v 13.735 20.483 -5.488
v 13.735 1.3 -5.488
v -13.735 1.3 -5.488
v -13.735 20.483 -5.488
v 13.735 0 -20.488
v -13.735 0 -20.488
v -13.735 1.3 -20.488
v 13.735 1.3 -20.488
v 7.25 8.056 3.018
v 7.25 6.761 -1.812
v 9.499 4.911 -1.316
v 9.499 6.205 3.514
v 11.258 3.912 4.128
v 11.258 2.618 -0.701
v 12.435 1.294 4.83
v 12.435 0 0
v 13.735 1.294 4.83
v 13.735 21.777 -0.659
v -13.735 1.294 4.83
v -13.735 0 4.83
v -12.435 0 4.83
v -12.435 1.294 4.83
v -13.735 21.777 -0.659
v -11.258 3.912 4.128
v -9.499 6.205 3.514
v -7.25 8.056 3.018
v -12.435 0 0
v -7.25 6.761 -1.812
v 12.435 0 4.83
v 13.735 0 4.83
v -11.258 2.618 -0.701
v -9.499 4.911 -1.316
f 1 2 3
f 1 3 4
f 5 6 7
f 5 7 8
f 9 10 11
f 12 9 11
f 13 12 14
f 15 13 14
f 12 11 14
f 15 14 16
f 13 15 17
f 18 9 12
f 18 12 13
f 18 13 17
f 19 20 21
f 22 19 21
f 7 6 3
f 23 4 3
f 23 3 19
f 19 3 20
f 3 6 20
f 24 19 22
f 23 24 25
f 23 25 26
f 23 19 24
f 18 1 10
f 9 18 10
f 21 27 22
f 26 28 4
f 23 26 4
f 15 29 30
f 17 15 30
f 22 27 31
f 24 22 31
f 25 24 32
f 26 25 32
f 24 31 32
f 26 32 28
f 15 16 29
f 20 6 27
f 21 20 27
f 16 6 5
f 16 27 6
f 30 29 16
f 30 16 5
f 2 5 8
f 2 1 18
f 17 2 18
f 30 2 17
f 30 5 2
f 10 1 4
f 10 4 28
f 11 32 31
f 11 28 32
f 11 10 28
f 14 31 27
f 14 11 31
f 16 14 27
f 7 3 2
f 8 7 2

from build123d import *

# Parameters (mm, degrees)
F1_DEPTH = 5
F2_ANGLE = -15
F4_DEPTH = 27.4701582612
F5_W     = 27.4701582612
F5_H     = 15
F6_DEPTH = 1.3
F7_W     = 1.3
F7_H     = 4.8296291314


with BuildPart() as f1:
    # F0 (on Top) → F1 (new body)
    with BuildSketch(Plane.XY):
        with BuildLine():
            ThreePointArc((-12.4350791306, 0), (-10.4463192127, 3.9472350356), (-7.25, 7))
            Line((-7.25, 7), (-13.7350791306, 21.2054114289))
            Line((-13.7350791306, 21.2054114289), (-13.7350791306, 0))
            Line((-13.7350791306, 0), (-12.4350791306, 0))
        make_face()
    extrude(amount=F1_DEPTH)


with BuildPart() as f1b:
    # F0 (on Top) → F1, piece 2 (new body)
    with BuildSketch(Plane.XY):
        with BuildLine():
            Line((13.7350791306, 0), (13.7350791306, 21.2054114289))
            Line((13.7350791306, 21.2054114289), (7.25, 7))
            ThreePointArc((7.25, 7), (10.4463192127, 3.9472350356), (12.4350791306, 0))
            Line((12.4350791306, 0), (13.7350791306, 0))
        make_face()
    extrude(amount=F1_DEPTH)


with BuildPart() as f1_1:
    # F2: moved
    add(f1.part.rotate(Axis((0.65, 0, 0), (1, 0, 0)), F2_ANGLE))



with BuildPart() as f1b_1:
    # F2: moved
    add(f1b.part.rotate(Axis((0.65, 0, 0), (1, 0, 0)), F2_ANGLE))


with BuildPart() as f1_2:
    add(f1_1.part)

    add(f1b_1.part)  # F4 merges F1b
    # F3 (on face) → F4 (join, through all)
    with BuildSketch(Plane.YZ.offset(13.7350791306)):
        Polygon((20.4828545563, -5.488364337), (0, 0), (0, -5.488364337), align=None)
    extrude(amount=-F4_DEPTH)

    # F5 (on face) → F6 (join)
    with BuildSketch(Plane.XZ):
        with Locations((0, -12.988364337)):
            Rectangle(F5_W, F5_H)
    extrude(amount=-F6_DEPTH)

    # F7 (on face) → F8 (join, up to the next surface of F1)
    with BuildSketch(Plane.XZ):
        with Locations((-13.0850791306, 2.4148145657)):
            Rectangle(F7_W, F7_H)
        with Locations((13.0850791306, 2.4148145657)):
            Rectangle(F7_W, F7_H)
    extrude(until=Until.NEXT, dir=(0, 1, 0))


solid = f1_2.part
